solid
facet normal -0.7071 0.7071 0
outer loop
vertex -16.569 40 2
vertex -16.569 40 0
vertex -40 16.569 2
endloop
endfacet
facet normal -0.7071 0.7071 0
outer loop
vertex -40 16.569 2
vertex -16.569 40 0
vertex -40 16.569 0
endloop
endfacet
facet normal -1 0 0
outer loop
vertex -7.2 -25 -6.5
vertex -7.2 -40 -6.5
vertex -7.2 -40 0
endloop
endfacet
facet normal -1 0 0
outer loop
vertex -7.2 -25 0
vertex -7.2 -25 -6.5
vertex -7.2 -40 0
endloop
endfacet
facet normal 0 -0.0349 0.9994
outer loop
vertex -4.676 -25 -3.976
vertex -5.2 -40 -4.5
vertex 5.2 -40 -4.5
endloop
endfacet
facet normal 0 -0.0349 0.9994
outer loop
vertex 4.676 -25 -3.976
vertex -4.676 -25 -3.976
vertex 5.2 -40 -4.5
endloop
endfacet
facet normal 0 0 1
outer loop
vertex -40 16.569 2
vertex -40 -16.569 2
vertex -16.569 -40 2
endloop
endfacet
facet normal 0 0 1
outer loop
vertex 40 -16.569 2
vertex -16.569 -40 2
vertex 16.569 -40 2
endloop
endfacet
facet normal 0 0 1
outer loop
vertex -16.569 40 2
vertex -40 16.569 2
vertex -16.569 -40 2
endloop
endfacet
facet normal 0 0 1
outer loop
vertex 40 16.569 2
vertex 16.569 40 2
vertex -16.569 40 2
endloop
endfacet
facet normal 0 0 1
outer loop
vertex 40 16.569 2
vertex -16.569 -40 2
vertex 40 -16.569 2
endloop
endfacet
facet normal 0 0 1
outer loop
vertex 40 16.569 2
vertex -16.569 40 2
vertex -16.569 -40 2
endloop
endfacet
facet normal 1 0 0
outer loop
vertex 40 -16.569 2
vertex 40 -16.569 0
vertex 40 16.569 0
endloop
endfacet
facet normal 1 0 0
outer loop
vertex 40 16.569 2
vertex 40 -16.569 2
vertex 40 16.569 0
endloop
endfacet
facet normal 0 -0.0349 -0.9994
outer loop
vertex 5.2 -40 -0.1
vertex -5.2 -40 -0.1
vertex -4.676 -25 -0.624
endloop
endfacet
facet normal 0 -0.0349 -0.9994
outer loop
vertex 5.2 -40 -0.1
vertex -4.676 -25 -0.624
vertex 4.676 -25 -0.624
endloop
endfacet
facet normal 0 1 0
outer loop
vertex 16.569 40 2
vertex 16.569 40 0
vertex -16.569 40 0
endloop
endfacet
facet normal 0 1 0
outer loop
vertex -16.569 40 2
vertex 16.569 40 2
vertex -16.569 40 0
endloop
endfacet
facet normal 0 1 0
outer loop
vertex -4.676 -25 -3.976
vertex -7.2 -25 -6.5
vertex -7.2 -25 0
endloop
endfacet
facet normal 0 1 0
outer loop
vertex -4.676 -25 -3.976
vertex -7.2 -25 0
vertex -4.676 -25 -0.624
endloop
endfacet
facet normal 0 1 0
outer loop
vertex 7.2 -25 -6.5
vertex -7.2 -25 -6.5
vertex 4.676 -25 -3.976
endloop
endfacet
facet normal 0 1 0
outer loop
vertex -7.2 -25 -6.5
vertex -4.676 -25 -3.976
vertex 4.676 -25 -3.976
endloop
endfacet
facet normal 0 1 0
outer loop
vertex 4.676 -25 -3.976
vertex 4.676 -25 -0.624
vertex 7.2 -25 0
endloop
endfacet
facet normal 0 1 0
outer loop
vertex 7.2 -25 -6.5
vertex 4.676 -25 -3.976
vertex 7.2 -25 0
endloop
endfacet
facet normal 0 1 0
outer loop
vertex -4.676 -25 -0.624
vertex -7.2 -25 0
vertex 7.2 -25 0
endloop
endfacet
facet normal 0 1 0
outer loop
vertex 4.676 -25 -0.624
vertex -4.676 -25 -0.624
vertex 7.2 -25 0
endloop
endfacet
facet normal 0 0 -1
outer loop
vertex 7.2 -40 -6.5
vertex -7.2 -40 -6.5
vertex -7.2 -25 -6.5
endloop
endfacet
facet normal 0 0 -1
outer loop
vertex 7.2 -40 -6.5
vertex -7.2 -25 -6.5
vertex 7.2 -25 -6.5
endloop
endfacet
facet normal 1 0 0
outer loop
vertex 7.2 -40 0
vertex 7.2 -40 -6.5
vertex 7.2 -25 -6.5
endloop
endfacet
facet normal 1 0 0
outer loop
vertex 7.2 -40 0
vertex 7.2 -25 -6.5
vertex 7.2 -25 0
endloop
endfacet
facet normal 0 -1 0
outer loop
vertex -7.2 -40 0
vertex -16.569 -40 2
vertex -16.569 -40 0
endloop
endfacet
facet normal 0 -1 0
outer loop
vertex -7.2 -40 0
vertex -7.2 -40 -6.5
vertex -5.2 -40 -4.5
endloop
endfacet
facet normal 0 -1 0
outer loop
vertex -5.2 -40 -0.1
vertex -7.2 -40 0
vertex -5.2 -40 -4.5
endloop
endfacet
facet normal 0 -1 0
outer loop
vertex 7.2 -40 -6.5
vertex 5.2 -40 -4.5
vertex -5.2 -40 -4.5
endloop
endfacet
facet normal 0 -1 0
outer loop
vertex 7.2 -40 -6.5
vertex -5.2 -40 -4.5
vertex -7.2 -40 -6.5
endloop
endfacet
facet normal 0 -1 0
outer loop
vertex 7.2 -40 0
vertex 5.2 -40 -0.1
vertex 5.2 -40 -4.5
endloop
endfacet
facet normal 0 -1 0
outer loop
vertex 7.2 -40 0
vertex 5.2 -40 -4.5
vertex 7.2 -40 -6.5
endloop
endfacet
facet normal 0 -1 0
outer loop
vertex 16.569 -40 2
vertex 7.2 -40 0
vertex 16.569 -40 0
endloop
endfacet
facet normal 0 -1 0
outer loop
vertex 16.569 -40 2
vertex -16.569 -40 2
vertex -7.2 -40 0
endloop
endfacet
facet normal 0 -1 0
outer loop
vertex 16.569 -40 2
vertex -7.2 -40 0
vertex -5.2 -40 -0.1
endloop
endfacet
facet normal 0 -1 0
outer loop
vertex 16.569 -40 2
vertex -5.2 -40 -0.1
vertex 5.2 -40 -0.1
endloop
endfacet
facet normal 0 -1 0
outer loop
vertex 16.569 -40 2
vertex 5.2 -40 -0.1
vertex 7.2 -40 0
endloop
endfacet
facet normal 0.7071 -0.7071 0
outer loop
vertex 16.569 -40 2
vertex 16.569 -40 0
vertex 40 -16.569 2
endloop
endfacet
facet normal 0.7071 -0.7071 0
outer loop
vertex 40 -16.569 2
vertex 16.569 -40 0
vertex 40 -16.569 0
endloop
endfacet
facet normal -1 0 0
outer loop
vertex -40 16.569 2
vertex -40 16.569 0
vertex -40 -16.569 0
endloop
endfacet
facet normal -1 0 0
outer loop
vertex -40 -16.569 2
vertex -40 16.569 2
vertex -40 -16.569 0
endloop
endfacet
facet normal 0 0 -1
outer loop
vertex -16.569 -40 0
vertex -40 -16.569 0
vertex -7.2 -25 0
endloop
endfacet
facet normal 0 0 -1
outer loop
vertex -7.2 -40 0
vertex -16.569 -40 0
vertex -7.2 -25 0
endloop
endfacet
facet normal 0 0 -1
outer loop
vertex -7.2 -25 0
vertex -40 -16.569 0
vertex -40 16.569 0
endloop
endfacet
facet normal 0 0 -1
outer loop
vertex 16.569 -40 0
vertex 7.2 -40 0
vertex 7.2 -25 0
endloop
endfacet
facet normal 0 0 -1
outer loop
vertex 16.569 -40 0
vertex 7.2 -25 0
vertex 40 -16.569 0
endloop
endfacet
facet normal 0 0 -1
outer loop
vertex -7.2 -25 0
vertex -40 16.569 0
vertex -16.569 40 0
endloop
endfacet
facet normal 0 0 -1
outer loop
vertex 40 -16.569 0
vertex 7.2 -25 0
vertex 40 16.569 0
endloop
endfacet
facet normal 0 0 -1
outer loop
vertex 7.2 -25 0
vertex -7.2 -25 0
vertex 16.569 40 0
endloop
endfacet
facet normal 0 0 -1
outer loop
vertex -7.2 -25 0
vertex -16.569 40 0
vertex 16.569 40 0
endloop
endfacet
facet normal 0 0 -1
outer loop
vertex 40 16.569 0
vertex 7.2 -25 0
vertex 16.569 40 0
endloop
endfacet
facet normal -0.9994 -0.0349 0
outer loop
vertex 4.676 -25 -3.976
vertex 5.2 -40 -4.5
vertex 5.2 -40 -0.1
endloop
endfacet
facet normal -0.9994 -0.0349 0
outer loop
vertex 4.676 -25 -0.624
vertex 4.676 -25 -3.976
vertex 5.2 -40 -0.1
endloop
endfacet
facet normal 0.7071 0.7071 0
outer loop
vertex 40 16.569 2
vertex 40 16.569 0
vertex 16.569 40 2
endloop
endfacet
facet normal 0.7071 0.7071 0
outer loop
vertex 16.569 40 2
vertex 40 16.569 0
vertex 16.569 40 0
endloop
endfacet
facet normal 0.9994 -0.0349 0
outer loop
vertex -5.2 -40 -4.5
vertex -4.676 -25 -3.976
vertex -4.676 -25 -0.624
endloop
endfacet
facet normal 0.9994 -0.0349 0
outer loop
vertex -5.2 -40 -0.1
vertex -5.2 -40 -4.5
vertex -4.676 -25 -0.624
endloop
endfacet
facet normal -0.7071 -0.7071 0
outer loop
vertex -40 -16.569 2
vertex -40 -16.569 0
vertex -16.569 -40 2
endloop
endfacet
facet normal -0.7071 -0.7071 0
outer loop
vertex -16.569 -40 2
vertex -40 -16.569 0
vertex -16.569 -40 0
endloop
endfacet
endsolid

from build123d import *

# Parameters (mm, degrees)
BOSS_EXTRU_1_DEPTH = 2
ESQUISSE3_W        = 14.4
ESQUISSE3_H        = 8.4
ESQUISSE3_W_2      = 10.4
ESQUISSE3_H_2      = 4.4
BOSS_EXTRU_3_DEPTH = 15
D_POUILLE3_ANGLE   = 2


with BuildPart() as part:
    # Esquisse1 → Boss.-Extru.1 (new body)
    with BuildSketch(Plane.XY):
        Polygon((16.568542495, -40), (40, -16.568542495), (40, 16.568542495), (16.568542495, 40), (-16.568542495, 40), (-40, 16.568542495), (-40, -16.568542495), (-16.568542495, -40), align=None)
    extrude(amount=BOSS_EXTRU_1_DEPTH)

    # Esquisse3 → Boss.-Extru.3 (add)
    with BuildSketch(Plane.XZ.offset(40)):
        with Locations((0, -2.3)):
            Rectangle(ESQUISSE3_W, ESQUISSE3_H)
        with Locations((0, -2.3)):
            Rectangle(ESQUISSE3_W_2, ESQUISSE3_H_2, mode=Mode.SUBTRACT)
    extrude(amount=-BOSS_EXTRU_3_DEPTH)

    # Dépouille3
    d_pouille3_faces = [part.faces().sort_by_distance(p)[0] for p in [
        (0, -32.5, -0.1),
        (-5.2, -32.5, -2.3),
        (0, -32.5, -4.5),
        (5.2, -32.5, -2.3),
    ]]
    draft(d_pouille3_faces, Plane(origin=(-16.568542495, -40, 2), x_dir=(-1, 0, 0), z_dir=(0, -1, 0)), D_POUILLE3_ANGLE)


solid = part.part
